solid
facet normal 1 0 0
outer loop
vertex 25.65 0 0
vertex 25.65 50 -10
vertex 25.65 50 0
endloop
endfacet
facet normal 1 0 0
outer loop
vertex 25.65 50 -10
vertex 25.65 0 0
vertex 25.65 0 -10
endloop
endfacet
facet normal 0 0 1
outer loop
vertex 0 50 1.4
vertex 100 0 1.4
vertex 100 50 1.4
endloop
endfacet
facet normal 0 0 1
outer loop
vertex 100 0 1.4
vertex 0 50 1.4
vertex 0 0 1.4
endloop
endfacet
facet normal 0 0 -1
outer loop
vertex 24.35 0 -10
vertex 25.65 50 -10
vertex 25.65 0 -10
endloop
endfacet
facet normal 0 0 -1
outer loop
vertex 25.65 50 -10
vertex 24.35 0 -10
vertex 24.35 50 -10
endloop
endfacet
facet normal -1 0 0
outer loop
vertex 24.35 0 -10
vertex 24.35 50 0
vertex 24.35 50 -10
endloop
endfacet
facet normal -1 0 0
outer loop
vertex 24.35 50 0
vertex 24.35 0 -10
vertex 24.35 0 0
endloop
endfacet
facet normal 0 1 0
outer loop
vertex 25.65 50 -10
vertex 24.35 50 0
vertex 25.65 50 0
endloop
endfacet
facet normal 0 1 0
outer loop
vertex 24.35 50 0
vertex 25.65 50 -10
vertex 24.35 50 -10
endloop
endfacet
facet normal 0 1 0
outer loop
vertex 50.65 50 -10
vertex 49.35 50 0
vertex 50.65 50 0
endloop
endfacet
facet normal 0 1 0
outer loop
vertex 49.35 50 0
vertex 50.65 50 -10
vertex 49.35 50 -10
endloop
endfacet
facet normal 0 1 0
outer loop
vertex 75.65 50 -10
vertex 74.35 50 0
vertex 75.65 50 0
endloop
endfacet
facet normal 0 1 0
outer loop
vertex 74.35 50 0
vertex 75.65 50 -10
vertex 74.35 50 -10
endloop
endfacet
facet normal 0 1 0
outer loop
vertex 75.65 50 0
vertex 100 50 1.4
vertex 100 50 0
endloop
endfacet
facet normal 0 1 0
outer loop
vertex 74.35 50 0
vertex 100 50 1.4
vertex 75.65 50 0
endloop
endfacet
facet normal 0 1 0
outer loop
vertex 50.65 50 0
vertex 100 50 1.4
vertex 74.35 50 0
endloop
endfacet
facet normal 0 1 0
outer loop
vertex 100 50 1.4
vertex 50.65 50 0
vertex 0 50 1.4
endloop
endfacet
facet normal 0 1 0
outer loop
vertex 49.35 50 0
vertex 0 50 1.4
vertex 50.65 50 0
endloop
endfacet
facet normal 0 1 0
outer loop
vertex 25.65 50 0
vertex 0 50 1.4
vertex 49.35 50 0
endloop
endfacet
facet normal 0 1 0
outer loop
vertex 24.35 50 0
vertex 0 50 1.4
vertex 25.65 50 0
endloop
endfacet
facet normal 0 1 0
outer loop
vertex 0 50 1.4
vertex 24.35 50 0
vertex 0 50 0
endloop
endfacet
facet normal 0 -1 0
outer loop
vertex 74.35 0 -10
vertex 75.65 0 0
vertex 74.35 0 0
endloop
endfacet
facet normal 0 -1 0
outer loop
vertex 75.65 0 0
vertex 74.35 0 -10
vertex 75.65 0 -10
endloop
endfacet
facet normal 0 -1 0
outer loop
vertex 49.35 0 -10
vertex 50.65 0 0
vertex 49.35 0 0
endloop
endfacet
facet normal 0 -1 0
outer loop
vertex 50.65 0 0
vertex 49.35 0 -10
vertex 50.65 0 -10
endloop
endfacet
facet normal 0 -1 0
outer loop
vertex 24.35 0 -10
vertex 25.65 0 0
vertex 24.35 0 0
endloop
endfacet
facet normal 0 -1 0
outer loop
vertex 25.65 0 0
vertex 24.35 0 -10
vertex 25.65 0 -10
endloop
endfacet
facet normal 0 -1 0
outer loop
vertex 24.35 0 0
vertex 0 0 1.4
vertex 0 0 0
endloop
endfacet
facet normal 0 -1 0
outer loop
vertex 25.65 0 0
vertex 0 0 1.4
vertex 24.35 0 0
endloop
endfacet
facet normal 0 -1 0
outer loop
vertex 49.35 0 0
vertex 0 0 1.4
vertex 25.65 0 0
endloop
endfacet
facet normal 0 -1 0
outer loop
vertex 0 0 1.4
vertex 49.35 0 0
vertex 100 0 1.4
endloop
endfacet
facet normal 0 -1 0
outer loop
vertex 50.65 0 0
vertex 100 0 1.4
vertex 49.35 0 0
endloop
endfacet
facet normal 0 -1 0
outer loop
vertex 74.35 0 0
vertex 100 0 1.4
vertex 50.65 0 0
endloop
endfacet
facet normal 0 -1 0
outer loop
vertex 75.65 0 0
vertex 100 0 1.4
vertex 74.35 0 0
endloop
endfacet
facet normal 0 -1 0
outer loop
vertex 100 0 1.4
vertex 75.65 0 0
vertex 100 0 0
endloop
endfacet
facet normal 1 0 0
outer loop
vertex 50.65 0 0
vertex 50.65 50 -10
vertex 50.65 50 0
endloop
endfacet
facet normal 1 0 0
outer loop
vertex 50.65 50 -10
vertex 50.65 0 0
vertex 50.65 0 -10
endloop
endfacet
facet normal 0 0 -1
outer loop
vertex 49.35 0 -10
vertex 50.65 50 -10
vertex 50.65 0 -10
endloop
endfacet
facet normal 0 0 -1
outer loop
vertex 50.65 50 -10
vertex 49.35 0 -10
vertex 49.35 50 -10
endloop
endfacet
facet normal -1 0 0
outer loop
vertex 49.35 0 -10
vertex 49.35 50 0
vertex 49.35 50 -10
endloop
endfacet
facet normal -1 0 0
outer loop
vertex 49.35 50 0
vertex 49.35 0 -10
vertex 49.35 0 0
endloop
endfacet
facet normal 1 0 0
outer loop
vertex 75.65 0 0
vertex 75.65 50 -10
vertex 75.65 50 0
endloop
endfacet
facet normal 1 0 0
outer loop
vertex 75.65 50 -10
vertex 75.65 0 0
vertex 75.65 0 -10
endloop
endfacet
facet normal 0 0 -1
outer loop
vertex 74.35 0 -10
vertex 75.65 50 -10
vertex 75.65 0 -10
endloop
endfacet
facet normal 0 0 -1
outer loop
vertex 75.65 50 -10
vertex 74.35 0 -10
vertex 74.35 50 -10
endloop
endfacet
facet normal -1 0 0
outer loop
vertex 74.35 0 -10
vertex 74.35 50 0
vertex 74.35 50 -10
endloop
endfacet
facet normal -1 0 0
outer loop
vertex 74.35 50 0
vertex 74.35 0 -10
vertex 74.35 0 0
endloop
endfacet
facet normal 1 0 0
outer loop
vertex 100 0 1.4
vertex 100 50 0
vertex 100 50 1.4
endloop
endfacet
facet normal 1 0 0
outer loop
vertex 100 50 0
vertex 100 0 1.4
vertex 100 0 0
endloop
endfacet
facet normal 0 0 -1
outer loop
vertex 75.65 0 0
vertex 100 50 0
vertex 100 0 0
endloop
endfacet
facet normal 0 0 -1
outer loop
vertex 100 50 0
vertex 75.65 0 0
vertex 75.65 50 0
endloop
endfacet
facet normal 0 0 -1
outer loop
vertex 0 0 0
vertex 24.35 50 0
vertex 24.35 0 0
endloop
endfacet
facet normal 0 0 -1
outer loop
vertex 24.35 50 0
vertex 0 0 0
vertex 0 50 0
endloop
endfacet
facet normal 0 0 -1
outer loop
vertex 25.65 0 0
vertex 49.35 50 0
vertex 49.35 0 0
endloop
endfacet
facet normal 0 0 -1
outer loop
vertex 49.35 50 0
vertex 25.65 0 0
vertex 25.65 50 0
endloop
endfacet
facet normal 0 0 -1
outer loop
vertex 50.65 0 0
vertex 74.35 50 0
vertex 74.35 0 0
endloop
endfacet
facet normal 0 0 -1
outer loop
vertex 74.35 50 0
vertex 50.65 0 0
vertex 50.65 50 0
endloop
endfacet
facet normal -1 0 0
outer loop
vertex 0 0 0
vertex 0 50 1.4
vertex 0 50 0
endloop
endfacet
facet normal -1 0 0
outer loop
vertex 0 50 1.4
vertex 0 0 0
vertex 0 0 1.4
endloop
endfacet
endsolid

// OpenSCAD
$fn = 32;

// ----------------------------------------------------------------------
// Ribbed panel: 1.4 mm panel
// ----------------------------------------------------------------------

// --- parameters (mm) ---
panel_l = 100;            // panel length, X
panel_w = 50;             // panel width, Y
panel_t = 1.4;            // panel thickness, Z
rib_t = 1.3;              // rib thickness
rib_h = 10;               // rib height below the panel
ribs = 3;                 // number of ribs

total_h = panel_t + rib_h;  // overall height

union() {
  cube([panel_l, panel_w, panel_t]);
  for (i = [1 : ribs])
    translate([i * panel_l / (ribs + 1) - rib_t / 2, 0, -rib_h])
      cube([rib_t, panel_w, rib_h + panel_t]);
}
